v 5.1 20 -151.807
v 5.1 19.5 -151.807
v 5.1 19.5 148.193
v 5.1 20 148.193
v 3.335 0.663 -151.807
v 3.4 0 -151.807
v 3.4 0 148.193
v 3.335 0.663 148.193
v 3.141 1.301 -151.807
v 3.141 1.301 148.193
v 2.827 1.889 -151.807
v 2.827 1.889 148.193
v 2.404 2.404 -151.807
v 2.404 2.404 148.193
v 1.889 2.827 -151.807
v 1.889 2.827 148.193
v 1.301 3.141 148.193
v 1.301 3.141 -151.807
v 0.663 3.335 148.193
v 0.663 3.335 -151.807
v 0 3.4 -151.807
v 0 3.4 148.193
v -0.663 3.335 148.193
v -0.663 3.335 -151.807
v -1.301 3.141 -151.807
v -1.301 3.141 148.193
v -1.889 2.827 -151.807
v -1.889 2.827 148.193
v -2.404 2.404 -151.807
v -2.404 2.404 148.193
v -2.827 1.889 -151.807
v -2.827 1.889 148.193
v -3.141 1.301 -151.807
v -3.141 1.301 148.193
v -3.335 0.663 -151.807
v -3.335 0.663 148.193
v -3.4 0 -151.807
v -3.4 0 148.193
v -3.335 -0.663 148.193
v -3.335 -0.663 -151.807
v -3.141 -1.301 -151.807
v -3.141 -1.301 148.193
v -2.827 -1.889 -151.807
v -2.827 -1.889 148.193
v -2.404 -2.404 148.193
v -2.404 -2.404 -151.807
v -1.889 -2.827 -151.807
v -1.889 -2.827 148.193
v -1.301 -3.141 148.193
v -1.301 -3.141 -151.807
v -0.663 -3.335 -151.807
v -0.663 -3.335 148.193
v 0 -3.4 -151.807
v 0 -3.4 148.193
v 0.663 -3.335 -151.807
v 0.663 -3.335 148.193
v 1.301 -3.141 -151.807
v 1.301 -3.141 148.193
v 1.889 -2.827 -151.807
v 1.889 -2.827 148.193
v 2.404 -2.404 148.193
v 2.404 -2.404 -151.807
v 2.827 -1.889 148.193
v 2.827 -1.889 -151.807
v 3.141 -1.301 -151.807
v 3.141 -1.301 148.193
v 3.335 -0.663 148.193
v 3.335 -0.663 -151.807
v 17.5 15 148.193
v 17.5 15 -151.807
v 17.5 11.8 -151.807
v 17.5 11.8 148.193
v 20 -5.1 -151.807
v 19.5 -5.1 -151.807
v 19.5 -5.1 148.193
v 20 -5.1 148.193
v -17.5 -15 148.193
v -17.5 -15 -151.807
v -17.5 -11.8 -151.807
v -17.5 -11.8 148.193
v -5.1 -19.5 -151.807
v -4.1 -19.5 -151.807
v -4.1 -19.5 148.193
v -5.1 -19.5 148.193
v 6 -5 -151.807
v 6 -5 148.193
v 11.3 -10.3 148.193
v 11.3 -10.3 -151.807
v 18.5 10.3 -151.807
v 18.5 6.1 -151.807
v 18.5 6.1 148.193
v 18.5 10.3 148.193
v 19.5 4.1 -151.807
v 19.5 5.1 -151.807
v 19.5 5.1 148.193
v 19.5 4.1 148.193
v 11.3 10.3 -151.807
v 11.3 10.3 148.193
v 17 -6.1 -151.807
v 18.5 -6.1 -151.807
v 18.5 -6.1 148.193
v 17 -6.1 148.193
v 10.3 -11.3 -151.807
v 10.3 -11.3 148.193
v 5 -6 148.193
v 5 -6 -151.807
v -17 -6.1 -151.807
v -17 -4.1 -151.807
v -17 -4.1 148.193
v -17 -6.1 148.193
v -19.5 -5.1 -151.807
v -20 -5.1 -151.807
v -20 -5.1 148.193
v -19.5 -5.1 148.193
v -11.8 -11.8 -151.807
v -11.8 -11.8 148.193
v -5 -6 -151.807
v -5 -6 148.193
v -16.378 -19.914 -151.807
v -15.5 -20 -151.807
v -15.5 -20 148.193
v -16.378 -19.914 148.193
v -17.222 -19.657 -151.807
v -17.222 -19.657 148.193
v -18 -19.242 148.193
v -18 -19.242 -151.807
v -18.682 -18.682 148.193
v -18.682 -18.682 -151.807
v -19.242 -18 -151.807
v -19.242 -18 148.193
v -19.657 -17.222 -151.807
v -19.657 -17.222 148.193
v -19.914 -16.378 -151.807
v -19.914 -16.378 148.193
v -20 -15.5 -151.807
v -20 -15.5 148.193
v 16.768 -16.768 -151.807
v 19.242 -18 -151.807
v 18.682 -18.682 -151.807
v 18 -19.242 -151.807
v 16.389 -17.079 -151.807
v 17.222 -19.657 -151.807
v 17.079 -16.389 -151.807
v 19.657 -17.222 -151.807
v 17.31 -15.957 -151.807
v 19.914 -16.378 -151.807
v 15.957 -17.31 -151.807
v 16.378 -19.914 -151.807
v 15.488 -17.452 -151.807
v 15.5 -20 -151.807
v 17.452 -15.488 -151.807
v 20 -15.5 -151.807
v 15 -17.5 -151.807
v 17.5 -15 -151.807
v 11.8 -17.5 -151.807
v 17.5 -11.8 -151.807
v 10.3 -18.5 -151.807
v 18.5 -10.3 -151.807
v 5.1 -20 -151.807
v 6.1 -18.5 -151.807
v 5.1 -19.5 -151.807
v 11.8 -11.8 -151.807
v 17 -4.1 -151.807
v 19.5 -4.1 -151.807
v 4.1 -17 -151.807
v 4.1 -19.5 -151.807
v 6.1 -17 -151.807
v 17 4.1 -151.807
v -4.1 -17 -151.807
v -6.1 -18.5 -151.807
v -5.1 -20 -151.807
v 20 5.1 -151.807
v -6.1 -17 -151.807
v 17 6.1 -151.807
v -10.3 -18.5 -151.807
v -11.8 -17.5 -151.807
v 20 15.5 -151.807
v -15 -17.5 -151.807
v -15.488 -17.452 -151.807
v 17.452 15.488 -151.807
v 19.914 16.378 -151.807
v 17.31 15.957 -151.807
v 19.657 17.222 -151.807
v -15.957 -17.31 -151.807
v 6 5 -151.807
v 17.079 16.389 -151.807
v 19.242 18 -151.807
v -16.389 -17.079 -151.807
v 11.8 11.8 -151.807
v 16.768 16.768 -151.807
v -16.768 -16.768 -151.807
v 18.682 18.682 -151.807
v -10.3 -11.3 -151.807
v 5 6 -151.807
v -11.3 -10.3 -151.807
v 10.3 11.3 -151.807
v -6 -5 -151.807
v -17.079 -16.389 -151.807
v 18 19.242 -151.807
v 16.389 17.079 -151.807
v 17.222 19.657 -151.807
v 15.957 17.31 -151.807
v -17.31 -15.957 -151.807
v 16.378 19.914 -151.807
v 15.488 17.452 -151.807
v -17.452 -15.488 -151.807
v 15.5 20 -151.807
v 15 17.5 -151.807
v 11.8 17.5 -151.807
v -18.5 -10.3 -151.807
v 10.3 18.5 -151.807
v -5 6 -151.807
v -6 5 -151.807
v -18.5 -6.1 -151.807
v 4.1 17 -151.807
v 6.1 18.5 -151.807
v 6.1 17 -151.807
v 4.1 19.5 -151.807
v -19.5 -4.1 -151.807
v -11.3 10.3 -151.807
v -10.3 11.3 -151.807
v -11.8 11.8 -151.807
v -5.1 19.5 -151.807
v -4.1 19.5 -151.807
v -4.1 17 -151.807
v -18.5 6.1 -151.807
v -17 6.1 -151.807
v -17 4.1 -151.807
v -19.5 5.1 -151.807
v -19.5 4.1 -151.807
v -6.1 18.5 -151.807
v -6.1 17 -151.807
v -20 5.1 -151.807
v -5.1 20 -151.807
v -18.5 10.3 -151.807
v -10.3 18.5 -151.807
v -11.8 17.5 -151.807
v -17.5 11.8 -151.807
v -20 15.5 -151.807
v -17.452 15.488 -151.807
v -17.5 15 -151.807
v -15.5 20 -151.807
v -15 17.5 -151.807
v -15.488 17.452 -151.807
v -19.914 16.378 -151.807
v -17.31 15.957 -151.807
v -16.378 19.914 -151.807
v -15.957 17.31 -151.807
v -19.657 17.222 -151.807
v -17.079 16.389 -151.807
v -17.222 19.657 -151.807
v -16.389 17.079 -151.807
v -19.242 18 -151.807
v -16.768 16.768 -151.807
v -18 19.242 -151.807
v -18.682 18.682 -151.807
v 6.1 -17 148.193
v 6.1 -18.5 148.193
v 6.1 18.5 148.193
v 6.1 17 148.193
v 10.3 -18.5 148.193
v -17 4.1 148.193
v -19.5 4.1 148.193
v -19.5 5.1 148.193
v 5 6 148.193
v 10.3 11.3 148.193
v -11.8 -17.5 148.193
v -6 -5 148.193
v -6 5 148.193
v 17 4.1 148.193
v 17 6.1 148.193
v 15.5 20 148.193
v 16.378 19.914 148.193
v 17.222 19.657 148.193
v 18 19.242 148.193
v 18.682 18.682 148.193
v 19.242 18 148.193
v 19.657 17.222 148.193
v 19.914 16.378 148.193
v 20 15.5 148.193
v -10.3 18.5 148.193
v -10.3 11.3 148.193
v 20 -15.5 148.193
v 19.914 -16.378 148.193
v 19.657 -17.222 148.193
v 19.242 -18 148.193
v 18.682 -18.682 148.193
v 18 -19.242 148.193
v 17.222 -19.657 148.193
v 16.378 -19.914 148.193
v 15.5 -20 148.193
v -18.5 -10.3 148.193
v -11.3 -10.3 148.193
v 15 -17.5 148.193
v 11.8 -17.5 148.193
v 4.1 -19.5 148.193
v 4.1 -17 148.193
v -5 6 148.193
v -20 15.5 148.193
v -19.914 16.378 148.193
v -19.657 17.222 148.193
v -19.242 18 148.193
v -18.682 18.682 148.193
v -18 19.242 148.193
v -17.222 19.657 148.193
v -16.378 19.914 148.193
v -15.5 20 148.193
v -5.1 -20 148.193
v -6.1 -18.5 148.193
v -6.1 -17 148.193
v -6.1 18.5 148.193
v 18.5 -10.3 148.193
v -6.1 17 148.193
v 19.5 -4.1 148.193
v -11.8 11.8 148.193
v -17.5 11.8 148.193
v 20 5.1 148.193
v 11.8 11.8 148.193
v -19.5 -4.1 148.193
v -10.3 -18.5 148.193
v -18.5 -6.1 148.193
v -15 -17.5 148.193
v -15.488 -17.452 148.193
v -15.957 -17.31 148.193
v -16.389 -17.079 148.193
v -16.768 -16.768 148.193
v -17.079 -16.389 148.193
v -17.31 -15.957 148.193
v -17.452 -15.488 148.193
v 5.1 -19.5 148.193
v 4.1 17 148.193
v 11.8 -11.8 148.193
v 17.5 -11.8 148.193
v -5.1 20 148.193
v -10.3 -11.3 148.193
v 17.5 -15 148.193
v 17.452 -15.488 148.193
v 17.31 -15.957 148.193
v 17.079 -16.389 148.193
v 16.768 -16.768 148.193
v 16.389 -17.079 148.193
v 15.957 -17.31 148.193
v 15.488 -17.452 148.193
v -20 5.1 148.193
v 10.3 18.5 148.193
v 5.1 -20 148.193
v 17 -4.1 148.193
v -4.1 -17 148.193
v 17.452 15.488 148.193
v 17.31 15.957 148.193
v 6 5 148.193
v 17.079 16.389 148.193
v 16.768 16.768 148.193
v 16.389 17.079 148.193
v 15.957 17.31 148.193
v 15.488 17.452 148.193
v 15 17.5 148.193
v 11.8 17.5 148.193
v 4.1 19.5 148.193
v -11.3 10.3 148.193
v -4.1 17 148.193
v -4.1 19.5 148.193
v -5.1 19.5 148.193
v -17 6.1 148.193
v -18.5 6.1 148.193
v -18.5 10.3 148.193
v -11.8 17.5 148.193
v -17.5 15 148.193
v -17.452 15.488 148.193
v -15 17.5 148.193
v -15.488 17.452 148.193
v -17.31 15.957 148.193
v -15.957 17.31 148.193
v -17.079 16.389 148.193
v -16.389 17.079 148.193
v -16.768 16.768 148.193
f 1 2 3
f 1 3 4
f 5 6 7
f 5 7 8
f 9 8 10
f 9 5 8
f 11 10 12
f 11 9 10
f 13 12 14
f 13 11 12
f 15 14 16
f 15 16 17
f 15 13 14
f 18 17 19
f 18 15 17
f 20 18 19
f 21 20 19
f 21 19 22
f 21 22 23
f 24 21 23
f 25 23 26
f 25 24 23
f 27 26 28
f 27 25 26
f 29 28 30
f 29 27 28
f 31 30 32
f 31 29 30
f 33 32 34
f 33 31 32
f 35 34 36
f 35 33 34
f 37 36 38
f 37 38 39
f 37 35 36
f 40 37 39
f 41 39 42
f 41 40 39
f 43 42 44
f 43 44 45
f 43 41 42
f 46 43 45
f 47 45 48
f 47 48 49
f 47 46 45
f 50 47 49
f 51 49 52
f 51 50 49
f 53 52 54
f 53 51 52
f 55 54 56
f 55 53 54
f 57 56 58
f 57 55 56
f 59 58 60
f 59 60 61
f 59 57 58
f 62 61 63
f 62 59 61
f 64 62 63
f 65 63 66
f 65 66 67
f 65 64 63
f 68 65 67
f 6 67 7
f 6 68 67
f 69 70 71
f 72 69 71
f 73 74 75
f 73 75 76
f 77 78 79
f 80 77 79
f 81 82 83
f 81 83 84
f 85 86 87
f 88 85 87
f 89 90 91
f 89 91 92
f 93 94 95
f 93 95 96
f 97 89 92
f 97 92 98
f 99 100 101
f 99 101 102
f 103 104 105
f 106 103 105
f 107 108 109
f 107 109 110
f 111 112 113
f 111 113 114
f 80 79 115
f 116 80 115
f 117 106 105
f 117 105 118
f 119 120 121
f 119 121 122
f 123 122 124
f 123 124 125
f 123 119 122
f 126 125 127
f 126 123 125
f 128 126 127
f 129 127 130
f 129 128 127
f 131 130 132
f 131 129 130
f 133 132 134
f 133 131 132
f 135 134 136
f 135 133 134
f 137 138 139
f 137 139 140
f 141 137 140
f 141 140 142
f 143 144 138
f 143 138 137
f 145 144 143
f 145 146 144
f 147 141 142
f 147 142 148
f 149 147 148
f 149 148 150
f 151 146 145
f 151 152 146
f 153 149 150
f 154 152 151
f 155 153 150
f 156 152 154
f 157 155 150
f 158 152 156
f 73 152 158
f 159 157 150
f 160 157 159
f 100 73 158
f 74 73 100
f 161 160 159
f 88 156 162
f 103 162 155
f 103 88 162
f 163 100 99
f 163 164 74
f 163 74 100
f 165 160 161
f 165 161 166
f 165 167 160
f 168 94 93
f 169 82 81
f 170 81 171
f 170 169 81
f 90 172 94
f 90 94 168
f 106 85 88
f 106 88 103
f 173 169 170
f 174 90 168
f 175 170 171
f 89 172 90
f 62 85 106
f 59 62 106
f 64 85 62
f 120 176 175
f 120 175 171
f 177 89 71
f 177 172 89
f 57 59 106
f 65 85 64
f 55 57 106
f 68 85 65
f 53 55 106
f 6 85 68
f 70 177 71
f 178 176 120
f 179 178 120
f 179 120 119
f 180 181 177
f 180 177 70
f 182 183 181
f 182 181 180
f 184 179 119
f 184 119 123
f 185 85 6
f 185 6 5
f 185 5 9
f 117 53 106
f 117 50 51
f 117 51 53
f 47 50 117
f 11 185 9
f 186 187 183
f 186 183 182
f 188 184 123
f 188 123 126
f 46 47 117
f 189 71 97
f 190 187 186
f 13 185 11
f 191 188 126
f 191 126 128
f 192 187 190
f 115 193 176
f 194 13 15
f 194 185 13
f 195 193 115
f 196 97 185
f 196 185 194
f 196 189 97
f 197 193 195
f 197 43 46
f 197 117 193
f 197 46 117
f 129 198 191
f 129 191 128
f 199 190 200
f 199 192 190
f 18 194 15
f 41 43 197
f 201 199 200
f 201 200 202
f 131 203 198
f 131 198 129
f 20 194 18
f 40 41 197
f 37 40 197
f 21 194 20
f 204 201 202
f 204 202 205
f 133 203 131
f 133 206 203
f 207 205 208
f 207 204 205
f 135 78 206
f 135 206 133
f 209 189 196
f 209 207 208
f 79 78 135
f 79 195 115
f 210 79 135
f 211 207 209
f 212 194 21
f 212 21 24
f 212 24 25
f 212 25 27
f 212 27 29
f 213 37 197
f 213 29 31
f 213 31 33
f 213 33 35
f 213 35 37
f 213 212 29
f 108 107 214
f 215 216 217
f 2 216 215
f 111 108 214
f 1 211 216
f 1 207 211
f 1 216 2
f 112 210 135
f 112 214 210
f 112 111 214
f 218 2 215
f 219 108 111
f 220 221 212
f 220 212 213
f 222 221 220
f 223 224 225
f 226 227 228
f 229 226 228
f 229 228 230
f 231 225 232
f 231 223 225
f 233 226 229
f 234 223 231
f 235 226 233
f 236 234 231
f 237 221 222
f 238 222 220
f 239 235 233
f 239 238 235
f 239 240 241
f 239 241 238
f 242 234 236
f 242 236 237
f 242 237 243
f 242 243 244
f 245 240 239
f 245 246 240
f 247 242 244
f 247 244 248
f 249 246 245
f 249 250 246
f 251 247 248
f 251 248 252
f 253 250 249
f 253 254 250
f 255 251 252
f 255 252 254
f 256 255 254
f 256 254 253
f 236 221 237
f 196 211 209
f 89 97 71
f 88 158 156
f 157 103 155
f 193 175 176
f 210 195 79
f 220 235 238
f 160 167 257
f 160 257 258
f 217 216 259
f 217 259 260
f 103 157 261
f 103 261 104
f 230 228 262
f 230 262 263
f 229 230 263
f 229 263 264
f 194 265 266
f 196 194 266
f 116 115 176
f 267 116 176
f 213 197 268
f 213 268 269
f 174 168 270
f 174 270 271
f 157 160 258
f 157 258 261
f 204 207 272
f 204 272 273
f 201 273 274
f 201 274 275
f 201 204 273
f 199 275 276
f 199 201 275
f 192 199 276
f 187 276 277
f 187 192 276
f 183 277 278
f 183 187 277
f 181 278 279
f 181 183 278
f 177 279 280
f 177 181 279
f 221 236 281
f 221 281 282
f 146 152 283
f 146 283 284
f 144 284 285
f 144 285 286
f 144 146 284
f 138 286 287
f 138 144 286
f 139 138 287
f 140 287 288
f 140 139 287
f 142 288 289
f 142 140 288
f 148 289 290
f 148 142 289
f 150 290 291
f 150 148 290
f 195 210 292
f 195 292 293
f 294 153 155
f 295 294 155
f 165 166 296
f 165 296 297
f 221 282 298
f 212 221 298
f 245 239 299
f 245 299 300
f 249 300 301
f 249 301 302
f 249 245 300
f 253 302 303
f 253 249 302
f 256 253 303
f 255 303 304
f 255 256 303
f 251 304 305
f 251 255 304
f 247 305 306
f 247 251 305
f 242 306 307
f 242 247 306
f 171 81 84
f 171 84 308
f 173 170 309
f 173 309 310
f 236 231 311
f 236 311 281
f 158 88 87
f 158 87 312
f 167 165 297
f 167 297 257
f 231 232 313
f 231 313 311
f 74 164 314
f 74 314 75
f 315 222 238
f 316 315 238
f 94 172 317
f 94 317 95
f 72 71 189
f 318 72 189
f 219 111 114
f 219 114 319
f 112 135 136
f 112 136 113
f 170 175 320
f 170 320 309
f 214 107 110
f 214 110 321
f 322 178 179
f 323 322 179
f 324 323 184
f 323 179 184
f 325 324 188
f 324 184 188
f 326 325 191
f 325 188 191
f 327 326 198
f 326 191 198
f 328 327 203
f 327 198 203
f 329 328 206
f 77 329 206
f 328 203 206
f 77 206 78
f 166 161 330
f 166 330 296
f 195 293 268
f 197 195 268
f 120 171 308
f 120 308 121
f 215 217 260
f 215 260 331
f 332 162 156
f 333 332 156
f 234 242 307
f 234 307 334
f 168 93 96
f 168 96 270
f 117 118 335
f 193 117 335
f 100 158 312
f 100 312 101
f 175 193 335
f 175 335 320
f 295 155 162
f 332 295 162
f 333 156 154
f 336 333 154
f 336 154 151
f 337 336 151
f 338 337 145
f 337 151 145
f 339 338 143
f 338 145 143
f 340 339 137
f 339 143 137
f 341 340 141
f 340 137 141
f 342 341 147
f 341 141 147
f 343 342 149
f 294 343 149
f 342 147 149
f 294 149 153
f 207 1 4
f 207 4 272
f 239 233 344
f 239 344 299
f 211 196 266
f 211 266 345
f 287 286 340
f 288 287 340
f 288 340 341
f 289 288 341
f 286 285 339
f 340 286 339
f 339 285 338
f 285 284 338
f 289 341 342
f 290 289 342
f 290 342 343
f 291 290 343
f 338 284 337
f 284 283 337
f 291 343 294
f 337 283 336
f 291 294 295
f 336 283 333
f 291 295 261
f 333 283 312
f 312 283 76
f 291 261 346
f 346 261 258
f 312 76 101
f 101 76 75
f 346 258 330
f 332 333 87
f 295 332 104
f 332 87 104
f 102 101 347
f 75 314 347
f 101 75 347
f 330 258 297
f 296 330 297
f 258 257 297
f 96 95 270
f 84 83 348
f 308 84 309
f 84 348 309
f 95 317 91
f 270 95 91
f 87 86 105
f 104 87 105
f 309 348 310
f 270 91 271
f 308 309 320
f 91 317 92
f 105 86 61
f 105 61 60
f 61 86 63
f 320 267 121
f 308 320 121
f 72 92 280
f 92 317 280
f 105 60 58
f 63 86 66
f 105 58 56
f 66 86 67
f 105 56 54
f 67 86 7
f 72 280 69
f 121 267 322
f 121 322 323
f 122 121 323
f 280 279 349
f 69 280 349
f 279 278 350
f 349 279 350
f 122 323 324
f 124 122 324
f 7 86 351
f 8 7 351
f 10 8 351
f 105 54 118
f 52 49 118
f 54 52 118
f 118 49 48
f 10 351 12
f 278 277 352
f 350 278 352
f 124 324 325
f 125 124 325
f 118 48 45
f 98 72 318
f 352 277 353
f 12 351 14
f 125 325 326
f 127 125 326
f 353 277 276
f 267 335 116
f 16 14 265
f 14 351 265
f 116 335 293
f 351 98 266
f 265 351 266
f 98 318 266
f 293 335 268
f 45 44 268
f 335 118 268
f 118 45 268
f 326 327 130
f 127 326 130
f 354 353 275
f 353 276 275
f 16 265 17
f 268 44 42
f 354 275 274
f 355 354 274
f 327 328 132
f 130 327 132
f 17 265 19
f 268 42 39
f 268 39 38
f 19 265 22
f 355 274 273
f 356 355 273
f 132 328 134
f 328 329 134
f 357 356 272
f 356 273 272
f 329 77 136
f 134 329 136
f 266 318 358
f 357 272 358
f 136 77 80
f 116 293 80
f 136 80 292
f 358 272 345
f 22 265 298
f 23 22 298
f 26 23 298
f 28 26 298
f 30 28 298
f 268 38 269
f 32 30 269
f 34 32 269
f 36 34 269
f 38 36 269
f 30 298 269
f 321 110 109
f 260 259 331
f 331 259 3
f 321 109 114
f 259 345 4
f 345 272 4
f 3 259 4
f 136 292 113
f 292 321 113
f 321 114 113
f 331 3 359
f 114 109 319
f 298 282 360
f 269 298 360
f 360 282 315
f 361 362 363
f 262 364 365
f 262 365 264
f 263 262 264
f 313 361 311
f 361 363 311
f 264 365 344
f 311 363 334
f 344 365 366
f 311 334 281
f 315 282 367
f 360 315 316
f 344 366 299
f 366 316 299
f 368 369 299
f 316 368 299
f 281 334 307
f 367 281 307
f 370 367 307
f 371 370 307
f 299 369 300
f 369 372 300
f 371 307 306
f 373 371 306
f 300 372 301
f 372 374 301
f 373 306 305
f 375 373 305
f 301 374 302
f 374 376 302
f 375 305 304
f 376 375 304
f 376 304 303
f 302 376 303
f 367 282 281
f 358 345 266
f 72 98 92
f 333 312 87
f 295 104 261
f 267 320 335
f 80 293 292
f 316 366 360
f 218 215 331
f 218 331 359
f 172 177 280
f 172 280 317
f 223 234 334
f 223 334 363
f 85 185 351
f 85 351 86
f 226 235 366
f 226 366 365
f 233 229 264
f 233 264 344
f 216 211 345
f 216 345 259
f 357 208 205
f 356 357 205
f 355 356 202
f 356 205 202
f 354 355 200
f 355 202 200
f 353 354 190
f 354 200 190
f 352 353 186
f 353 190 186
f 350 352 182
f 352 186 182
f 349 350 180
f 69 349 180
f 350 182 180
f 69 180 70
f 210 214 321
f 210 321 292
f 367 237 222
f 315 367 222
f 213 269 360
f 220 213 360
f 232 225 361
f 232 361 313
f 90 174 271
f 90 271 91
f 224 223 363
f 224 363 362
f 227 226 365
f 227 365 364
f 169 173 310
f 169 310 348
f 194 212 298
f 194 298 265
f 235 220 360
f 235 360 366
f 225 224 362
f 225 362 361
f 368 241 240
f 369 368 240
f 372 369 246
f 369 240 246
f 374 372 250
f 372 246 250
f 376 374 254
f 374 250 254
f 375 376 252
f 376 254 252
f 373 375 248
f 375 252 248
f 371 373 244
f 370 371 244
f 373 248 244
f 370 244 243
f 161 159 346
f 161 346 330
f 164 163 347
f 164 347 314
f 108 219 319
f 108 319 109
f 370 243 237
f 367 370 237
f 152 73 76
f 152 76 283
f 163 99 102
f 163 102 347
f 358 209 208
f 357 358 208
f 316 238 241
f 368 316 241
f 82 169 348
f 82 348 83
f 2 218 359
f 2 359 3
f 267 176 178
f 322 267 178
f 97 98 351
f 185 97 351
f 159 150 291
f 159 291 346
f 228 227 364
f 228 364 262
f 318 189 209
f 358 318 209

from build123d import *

# Parameters (mm, degrees)
SKETCH1_R                 = 3.4
F_40_X_40L_X_R4_5_1_DEPTH = 300


with BuildPart() as part:
    # Sketch1 → 铝型材 40 X 40L X R4.5(1) (new body)
    with BuildSketch(Plane.XY.offset(-151.807228916)):
        with BuildLine():
            Line((-5.1, 20), (-5.1, 19.5))
            Line((-5.1, 19.5), (-4.1, 19.5))
            Line((-4.1, 19.5), (-4.1, 17))
            Line((-4.1, 17), (-6.1, 17))
            Line((-6.1, 17), (-6.1, 18.5))
            Line((-6.1, 18.5), (-10.3, 18.5))
            Line((-10.3, 18.5), (-10.3, 11.3))
            Line((-10.3, 11.3), (-5, 6))
            Line((-5, 6), (5, 6))
            Line((5, 6), (10.3, 11.3))
            Line((10.3, 11.3), (10.3, 18.5))
            Line((10.3, 18.5), (6.1, 18.5))
            Line((6.1, 18.5), (6.1, 17))
            Line((6.1, 17), (4.1, 17))
            Line((4.1, 17), (4.1, 19.5))
            Line((4.1, 19.5), (5.1, 19.5))
            Line((5.1, 19.5), (5.1, 20))
            Line((5.1, 20), (15.5, 20))
            ThreePointArc((15.5, 20), (18.681980515, 18.681980515), (20, 15.5))
            Line((20, 15.5), (20, 5.1))
            Line((20, 5.1), (19.5, 5.1))
            Line((19.5, 5.1), (19.5, 4.1))
            Line((19.5, 4.1), (17, 4.1))
            Line((17, 4.1), (17, 6.1))
            Line((17, 6.1), (18.5, 6.1))
            Line((18.5, 6.1), (18.5, 10.3))
            Line((18.5, 10.3), (11.3, 10.3))
            Line((11.3, 10.3), (6, 5))
            Line((6, 5), (6, -5))
            Line((6, -5), (11.3, -10.3))
            Line((11.3, -10.3), (18.5, -10.3))
            Line((18.5, -10.3), (18.5, -6.1))
            Line((18.5, -6.1), (17, -6.1))
            Line((17, -6.1), (17, -4.1))
            Line((17, -4.1), (19.5, -4.1))
            Line((19.5, -4.1), (19.5, -5.1))
            Line((19.5, -5.1), (20, -5.1))
            Line((20, -5.1), (20, -15.5))
            ThreePointArc((20, -15.5), (18.681980515, -18.681980515), (15.5, -20))
            Line((15.5, -20), (5.1, -20))
            Line((5.1, -20), (5.1, -19.5))
            Line((5.1, -19.5), (4.1, -19.5))
            Line((4.1, -19.5), (4.1, -17))
            Line((4.1, -17), (6.1, -17))
            Line((6.1, -17), (6.1, -18.5))
            Line((6.1, -18.5), (10.3, -18.5))
            Line((10.3, -18.5), (10.3, -11.3))
            Line((10.3, -11.3), (5, -6))
            Line((5, -6), (-5, -6))
            Line((-5, -6), (-10.3, -11.3))
            Line((-10.3, -11.3), (-10.3, -18.5))
            Line((-10.3, -18.5), (-6.1, -18.5))
            Line((-6.1, -18.5), (-6.1, -17))
            Line((-6.1, -17), (-4.1, -17))
            Line((-4.1, -17), (-4.1, -19.5))
            Line((-4.1, -19.5), (-5.1, -19.5))
            Line((-5.1, -19.5), (-5.1, -20))
            Line((-5.1, -20), (-15.5, -20))
            ThreePointArc((-15.5, -20), (-18.681980515, -18.681980515), (-20, -15.5))
            Line((-20, -15.5), (-20, -5.1))
            Line((-20, -5.1), (-19.5, -5.1))
            Line((-19.5, -5.1), (-19.5, -4.1))
            Line((-19.5, -4.1), (-17, -4.1))
            Line((-17, -4.1), (-17, -6.1))
            Line((-17, -6.1), (-18.5, -6.1))
            Line((-18.5, -6.1), (-18.5, -10.3))
            Line((-18.5, -10.3), (-11.3, -10.3))
            Line((-11.3, -10.3), (-6, -5))
            Line((-6, -5), (-6, 5))
            Line((-6, 5), (-11.3, 10.3))
            Line((-11.3, 10.3), (-18.5, 10.3))
            Line((-18.5, 10.3), (-18.5, 6.1))
            Line((-18.5, 6.1), (-17, 6.1))
            Line((-17, 6.1), (-17, 4.1))
            Line((-17, 4.1), (-19.5, 4.1))
            Line((-19.5, 4.1), (-19.5, 5.1))
            Line((-19.5, 5.1), (-20, 5.1))
            Line((-20, 5.1), (-20, 15.5))
            ThreePointArc((-20, 15.5), (-18.681980515, 18.681980515), (-15.5, 20))
            Line((-15.5, 20), (-5.1, 20))
        make_face()
        Circle(SKETCH1_R, mode=Mode.SUBTRACT)
        with BuildLine():
            Line((11.8, 17.5), (15, 17.5))
            ThreePointArc((15, 17.5), (16.767766953, 16.767766953), (17.5, 15))
            Line((17.5, 15), (17.5, 11.8))
            Line((17.5, 11.8), (11.8, 11.8))
            Line((11.8, 11.8), (11.8, 17.5))
        make_face(mode=Mode.SUBTRACT)
        with BuildLine():
            Line((-15, 17.5), (-11.8, 17.5))
            Line((-11.8, 17.5), (-11.8, 11.8))
            Line((-11.8, 11.8), (-17.5, 11.8))
            Line((-17.5, 11.8), (-17.5, 15))
            ThreePointArc((-17.5, 15), (-16.767766953, 16.767766953), (-15, 17.5))
        make_face(mode=Mode.SUBTRACT)
        with BuildLine():
            Line((-17.5, -11.8), (-11.8, -11.8))
            Line((-11.8, -11.8), (-11.8, -17.5))
            Line((-11.8, -17.5), (-15, -17.5))
            ThreePointArc((-15, -17.5), (-16.767766953, -16.767766953), (-17.5, -15))
            Line((-17.5, -15), (-17.5, -11.8))
        make_face(mode=Mode.SUBTRACT)
        with BuildLine():
            Line((11.8, -11.8), (17.5, -11.8))
            Line((17.5, -11.8), (17.5, -15))
            ThreePointArc((17.5, -15), (16.767766953, -16.767766953), (15, -17.5))
            Line((15, -17.5), (11.8, -17.5))
            Line((11.8, -17.5), (11.8, -11.8))
        make_face(mode=Mode.SUBTRACT)
    extrude(amount=F_40_X_40L_X_R4_5_1_DEPTH)


solid = part.part
